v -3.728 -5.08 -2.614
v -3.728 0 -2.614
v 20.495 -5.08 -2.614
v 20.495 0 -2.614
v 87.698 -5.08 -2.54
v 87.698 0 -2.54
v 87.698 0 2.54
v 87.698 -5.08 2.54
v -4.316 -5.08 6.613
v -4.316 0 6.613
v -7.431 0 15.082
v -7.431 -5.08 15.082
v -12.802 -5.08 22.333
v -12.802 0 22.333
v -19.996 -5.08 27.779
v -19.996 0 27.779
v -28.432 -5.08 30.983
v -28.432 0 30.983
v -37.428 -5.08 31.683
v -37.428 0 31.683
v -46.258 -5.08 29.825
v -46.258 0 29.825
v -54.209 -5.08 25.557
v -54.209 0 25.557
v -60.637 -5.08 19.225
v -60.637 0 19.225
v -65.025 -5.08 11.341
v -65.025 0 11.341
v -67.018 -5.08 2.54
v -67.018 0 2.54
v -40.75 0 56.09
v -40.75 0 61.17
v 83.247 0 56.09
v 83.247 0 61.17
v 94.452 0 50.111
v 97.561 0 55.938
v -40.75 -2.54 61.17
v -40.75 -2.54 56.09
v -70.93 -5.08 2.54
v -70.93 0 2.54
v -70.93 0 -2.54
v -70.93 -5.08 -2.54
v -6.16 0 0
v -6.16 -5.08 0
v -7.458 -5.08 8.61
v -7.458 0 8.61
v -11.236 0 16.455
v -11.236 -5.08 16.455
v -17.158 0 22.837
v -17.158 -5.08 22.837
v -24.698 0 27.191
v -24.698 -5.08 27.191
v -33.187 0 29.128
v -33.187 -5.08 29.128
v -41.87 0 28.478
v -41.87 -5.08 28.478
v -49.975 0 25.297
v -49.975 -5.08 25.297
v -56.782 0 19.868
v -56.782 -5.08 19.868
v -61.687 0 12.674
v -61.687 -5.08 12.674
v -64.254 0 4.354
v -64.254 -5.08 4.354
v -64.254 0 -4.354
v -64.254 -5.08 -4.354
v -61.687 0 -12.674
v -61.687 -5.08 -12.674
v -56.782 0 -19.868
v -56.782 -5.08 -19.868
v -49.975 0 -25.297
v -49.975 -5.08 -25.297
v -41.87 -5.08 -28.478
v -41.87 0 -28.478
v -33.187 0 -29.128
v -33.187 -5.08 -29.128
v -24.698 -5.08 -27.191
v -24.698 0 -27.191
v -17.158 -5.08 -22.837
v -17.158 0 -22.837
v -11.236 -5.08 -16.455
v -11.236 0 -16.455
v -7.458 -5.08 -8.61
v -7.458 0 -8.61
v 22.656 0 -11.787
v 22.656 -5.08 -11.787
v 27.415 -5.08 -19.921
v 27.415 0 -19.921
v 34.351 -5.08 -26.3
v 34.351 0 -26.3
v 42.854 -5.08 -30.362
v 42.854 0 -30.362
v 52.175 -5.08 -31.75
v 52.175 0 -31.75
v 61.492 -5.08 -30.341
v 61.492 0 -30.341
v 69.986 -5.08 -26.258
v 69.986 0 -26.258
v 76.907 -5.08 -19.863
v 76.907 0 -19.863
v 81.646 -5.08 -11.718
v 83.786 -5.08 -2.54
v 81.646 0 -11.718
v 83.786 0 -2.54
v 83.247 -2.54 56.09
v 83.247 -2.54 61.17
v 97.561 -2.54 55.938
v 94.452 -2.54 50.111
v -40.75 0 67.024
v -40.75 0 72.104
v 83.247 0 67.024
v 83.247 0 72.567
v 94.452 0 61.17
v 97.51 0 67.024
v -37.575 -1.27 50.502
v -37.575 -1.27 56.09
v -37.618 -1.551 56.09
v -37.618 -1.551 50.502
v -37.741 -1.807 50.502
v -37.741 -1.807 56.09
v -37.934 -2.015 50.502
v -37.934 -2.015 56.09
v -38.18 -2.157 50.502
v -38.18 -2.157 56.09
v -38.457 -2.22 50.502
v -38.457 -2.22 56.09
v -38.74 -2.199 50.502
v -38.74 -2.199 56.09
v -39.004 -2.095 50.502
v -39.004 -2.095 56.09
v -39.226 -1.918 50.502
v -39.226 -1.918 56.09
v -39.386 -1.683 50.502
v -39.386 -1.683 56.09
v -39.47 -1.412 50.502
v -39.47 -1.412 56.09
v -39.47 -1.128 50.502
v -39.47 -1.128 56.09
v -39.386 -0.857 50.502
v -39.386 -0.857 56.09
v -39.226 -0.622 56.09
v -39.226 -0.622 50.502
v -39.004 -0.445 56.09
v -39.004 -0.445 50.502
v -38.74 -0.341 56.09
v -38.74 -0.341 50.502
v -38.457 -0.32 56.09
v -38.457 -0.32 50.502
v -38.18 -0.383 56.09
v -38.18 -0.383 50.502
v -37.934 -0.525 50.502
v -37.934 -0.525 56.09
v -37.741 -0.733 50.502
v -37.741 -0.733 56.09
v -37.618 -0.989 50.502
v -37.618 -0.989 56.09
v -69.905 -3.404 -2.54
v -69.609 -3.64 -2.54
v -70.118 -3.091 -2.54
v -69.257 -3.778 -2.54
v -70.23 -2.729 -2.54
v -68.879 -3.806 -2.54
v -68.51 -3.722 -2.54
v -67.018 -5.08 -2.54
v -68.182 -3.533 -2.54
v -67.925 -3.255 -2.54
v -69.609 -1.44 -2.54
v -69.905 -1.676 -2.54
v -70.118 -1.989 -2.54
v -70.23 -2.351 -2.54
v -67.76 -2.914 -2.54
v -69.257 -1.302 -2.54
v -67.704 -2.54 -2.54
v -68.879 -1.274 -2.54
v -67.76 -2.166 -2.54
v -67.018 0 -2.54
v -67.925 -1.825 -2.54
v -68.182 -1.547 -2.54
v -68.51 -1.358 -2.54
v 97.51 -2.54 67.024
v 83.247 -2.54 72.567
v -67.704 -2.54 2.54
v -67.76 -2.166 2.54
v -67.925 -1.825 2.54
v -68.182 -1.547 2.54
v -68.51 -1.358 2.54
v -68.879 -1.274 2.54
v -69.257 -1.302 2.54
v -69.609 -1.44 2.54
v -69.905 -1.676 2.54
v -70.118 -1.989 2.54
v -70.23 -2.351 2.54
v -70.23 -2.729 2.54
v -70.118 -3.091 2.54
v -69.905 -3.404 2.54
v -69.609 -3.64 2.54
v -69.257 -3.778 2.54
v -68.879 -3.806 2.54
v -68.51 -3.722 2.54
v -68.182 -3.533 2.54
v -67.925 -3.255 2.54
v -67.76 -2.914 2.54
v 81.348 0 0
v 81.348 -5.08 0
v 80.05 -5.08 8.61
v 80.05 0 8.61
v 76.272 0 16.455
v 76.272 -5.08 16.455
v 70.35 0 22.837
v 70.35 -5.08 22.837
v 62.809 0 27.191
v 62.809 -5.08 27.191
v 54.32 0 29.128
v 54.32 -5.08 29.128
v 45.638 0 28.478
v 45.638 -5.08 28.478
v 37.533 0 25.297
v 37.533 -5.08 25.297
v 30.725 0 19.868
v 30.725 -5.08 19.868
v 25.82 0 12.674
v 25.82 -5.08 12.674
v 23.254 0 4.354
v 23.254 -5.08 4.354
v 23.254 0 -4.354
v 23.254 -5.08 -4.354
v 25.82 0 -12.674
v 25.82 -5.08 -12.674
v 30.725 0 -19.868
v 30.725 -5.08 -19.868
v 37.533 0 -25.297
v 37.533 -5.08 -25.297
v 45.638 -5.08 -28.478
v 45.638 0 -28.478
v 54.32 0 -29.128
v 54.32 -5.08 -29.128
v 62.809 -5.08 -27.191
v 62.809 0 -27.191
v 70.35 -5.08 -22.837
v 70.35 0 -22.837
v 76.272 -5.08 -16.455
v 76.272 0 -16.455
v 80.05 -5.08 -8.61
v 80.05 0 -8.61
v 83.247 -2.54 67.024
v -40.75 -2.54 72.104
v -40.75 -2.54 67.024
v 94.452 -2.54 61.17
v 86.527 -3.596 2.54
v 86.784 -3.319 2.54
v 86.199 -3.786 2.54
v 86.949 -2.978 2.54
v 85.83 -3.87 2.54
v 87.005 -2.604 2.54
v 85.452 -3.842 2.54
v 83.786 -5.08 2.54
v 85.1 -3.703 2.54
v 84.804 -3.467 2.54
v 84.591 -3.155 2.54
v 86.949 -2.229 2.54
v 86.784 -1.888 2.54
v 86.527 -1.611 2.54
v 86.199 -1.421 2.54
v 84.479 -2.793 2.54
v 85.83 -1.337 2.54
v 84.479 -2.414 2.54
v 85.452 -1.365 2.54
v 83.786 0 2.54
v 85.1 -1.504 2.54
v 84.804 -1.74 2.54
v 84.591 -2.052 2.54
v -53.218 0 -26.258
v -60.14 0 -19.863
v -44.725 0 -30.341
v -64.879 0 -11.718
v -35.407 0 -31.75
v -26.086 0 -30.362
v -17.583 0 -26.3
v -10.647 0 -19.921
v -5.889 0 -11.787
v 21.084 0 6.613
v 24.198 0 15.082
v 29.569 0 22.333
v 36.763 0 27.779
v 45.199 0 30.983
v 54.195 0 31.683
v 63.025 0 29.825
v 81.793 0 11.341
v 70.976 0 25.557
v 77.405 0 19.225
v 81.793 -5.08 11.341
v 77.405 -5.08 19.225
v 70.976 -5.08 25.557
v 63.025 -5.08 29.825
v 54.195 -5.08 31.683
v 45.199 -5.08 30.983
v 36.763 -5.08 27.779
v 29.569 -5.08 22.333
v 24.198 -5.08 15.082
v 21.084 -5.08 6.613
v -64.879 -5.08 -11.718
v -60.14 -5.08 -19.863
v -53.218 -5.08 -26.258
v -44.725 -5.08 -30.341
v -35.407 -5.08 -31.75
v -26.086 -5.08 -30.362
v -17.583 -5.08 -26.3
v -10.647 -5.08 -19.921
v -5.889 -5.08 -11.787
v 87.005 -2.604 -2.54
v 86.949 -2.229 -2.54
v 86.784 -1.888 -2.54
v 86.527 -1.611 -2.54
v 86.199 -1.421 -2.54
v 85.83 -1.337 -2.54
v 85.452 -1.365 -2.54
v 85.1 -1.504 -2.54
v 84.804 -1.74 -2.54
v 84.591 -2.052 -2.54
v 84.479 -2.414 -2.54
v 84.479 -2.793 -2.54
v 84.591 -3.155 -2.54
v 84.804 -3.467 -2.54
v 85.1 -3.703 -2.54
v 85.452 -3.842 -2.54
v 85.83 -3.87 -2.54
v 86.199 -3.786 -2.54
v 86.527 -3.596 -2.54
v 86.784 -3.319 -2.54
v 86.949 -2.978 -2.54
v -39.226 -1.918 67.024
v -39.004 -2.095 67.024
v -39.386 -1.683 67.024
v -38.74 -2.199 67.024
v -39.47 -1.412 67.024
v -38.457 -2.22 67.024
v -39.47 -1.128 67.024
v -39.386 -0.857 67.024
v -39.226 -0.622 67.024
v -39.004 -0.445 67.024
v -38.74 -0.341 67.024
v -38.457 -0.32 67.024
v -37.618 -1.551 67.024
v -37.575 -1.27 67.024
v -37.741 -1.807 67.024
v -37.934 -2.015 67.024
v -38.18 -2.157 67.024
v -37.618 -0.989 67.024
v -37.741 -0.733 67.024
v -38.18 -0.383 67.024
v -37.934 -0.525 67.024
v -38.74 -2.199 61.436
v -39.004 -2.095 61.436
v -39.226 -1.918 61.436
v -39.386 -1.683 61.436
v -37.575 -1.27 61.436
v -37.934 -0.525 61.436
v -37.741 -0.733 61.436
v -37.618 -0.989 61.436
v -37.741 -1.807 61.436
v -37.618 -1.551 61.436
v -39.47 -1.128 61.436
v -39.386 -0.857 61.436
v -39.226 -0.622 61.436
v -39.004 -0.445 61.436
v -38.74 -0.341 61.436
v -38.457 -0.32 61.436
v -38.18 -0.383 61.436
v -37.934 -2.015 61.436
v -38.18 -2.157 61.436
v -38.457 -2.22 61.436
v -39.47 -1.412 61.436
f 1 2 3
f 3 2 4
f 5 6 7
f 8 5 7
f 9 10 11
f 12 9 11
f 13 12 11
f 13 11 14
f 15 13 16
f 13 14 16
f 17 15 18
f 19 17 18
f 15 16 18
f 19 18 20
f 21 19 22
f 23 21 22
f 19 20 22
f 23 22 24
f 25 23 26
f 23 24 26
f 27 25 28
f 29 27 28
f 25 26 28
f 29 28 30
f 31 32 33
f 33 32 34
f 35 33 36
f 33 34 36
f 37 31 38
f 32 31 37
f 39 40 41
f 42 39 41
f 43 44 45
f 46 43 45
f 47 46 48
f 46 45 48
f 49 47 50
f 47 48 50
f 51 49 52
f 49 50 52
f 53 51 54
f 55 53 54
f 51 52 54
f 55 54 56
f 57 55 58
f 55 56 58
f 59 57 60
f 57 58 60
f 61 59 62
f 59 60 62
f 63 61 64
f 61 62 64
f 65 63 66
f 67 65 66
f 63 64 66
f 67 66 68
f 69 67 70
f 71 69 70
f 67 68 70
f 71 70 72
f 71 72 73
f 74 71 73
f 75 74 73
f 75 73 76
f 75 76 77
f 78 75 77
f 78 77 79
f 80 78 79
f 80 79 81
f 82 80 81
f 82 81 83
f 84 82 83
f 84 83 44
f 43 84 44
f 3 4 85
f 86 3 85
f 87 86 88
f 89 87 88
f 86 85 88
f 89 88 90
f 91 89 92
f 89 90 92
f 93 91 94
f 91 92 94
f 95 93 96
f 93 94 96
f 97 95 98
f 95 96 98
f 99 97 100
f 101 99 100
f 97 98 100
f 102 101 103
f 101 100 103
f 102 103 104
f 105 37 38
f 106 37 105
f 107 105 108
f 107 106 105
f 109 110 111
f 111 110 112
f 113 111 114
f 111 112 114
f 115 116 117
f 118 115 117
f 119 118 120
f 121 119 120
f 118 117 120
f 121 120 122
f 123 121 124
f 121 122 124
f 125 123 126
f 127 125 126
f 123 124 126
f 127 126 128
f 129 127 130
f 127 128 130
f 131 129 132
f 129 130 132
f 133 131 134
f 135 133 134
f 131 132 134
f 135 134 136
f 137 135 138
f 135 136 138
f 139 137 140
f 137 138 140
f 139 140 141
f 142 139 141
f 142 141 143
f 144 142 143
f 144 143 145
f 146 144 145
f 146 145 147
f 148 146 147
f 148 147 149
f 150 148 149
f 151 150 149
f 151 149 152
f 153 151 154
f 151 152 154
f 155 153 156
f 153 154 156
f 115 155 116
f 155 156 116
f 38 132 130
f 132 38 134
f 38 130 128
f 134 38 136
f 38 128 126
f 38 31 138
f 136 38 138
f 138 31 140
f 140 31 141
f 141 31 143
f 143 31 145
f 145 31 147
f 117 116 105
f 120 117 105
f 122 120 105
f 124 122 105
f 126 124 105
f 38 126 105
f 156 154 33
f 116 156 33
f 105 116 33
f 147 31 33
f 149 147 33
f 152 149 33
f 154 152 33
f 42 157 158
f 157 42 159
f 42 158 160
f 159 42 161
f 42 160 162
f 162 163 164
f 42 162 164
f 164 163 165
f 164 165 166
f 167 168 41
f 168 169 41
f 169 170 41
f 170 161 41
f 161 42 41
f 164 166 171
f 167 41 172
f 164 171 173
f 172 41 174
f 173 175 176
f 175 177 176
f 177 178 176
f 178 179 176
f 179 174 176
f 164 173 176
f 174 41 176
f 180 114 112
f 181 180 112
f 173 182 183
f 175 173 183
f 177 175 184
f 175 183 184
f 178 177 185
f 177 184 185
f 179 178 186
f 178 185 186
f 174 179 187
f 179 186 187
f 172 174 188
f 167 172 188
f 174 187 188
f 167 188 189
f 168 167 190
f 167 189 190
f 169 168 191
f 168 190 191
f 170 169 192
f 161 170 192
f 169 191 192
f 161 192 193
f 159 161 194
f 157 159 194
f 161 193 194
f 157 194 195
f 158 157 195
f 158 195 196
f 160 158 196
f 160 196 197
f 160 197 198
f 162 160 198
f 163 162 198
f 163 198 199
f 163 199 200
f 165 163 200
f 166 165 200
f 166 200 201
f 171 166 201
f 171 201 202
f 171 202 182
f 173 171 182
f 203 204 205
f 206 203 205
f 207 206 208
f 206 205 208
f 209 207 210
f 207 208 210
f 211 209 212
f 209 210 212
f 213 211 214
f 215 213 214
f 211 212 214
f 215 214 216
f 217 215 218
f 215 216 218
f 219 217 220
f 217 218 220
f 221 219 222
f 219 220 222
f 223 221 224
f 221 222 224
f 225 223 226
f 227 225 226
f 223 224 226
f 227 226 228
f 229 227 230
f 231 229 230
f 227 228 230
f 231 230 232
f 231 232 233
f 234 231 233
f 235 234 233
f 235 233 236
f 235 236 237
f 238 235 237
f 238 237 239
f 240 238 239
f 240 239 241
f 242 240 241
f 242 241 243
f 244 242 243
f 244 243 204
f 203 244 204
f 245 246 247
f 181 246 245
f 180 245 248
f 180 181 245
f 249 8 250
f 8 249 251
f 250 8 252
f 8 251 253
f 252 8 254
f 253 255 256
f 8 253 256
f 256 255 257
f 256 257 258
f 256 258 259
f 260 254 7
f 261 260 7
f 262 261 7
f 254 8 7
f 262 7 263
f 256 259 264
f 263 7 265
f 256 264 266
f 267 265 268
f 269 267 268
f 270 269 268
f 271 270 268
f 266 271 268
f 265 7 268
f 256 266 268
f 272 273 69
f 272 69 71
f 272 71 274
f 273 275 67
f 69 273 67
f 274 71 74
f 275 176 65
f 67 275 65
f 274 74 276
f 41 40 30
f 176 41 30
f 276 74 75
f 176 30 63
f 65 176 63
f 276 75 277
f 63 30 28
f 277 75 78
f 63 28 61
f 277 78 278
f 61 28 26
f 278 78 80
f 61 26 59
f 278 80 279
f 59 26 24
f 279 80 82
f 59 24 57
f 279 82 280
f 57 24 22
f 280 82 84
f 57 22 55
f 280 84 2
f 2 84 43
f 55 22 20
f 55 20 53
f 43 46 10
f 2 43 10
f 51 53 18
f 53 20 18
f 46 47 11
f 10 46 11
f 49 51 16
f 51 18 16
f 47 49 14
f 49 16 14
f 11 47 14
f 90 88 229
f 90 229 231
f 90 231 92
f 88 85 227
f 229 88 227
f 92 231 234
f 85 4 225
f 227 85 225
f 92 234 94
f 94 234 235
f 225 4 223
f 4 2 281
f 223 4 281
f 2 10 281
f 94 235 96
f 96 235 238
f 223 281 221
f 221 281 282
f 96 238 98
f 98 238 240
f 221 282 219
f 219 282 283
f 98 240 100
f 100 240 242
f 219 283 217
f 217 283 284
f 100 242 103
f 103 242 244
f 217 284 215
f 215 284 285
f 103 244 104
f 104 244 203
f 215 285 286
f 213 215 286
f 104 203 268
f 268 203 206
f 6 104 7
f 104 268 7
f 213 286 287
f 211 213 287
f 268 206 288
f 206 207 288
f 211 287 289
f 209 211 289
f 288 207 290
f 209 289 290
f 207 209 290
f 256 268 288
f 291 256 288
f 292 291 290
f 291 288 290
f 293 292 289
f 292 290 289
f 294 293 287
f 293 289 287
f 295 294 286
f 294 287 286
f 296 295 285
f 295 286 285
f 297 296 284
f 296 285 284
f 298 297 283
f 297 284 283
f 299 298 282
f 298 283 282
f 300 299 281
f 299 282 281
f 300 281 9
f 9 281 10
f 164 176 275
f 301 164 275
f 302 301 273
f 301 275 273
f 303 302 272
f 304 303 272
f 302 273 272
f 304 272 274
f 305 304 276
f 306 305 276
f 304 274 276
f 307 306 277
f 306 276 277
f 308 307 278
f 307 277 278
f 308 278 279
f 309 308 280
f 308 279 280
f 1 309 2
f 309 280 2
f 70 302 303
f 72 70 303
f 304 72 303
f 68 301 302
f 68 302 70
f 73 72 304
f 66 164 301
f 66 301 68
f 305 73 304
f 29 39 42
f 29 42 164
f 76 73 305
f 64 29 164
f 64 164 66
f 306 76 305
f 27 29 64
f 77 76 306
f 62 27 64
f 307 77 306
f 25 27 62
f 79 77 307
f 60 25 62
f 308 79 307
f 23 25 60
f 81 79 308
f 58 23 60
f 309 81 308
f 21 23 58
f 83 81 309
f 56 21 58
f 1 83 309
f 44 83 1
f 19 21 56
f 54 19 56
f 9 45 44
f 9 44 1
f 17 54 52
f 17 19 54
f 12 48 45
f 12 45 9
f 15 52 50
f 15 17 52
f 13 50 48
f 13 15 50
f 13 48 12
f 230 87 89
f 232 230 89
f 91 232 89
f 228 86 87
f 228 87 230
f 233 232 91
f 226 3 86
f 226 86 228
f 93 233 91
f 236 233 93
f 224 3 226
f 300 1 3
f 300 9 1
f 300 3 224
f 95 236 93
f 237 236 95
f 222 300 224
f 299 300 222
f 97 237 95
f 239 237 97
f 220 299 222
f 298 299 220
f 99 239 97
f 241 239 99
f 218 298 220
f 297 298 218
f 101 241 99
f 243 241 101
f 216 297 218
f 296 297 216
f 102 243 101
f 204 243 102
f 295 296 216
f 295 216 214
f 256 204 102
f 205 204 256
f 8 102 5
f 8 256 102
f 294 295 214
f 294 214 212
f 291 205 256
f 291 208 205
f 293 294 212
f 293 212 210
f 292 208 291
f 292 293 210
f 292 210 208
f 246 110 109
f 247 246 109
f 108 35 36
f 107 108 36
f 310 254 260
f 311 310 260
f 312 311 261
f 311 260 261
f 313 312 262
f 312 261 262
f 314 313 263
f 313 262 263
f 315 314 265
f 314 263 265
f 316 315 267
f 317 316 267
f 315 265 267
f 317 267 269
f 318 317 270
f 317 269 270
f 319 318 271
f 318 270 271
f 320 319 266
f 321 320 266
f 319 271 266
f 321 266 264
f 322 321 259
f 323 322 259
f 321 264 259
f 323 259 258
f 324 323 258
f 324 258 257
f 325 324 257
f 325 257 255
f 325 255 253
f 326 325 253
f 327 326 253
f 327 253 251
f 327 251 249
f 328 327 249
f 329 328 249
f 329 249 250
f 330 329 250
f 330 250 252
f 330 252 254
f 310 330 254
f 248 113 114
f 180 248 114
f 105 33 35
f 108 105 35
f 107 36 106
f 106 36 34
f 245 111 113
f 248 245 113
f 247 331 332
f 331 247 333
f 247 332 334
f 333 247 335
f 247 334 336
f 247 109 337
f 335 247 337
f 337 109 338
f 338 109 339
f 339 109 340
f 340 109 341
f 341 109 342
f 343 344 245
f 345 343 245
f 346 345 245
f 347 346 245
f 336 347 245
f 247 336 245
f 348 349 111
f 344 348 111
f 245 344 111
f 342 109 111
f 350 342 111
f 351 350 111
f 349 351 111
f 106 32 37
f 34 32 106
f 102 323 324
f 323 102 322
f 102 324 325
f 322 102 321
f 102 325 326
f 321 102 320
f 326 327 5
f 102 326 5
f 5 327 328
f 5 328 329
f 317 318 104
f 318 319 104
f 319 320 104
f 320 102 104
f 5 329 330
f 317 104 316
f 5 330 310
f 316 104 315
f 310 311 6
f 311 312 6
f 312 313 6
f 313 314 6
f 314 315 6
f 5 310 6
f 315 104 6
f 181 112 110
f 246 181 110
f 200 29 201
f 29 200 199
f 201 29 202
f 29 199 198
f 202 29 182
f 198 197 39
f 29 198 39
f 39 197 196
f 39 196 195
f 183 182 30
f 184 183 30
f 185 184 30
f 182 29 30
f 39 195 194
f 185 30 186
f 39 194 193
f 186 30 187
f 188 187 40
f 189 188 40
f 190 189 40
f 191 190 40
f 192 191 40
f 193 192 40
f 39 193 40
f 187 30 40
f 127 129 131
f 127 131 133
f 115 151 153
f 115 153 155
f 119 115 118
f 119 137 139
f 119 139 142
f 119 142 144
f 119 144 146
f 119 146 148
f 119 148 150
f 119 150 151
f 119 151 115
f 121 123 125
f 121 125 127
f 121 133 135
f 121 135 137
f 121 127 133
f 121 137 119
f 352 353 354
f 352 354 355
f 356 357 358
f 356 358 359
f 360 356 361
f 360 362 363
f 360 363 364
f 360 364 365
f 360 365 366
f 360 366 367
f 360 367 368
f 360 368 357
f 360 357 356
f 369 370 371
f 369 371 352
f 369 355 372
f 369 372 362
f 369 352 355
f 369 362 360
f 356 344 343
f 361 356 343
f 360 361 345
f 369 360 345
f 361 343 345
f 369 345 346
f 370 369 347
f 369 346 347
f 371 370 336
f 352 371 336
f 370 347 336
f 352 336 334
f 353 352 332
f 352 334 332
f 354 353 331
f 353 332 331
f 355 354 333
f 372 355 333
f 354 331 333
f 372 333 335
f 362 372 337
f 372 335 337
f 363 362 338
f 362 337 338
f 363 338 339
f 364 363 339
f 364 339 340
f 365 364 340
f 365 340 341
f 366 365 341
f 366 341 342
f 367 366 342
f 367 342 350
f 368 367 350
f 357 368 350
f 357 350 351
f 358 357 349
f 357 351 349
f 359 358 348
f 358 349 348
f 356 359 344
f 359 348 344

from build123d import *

# Parameters (mm, degrees)
F1_DEPTH  = 5.08
F2_R      = 29.21
F3_DEPTH  = 25.4
F4_R      = 1.27
F5_DEPTH  = 25.4
F7_DEPTH  = 2.54
F6_W      = 123.9972203185
F6_H      = 5.08
F8_R      = 0.9525
F9_DEPTH  = 5.588
F10_R     = 0.9525
F11_DEPTH = 5.588


with BuildPart() as f1:
    # F0 (on Front) → F1 (new body)
    with BuildSketch(Plane.XZ):
        with BuildLine():
            ThreePointArc((-3.7277518922, -2.6140995437), (-3.6469152678, -1.3081606084), (-3.6199544637, 0))
            ThreePointArc((-3.6199544637, 0), (-3.7945023837, 3.3246542598), (-4.3162269643, 6.6127534653))
            Line((-4.3162269643, 6.6127534653), (-3.7277518922, -2.6140995437))
        make_face()
        with BuildLine():
            ThreePointArc((-4.3162269643, 6.6127534653), (-3.7945023837, 3.3246542598), (-3.6199544637, 0))
            ThreePointArc((-3.6199544637, 0), (-3.6469152678, -1.3081606084), (-3.7277518922, -2.6140995437))
            Line((-3.7277518922, -2.6140995437), (20.4952979636, -2.6140995437))
            ThreePointArc((20.4952979636, -2.6140995437), (20.4518789383, 2.0208621982), (21.0837730357, 6.6127534653))
            Line((21.0837730357, 6.6127534653), (-4.3162269643, 6.6127534653))
        make_face()
        with BuildLine():
            Line((-3.7277518922, -2.6140995437), (-4.3162269643, 6.6127534653))
            ThreePointArc((-4.3162269643, 6.6127534653), (-37.4279123251, 31.6832338855), (-67.0181913814, 2.54))
            Line((-67.0181913814, 2.54), (-63.3099544637, 2.54))
            Line((-63.3099544637, 2.54), (-63.3099544637, -2.54))
            Line((-63.3099544637, -2.54), (-67.0181913814, -2.54))
            ThreePointArc((-67.0181913814, -2.54), (-35.4071268852, -31.7499782395), (-3.7277518922, -2.6140995437))
        make_face()
        with BuildLine():
            Line((-63.3099544637, 2.54), (-67.0181913814, 2.54))
            ThreePointArc((-67.0181913814, 2.54), (-67.1199544637, 0), (-67.0181913814, -2.54))
            Line((-67.0181913814, -2.54), (-63.3099544637, -2.54))
            Line((-63.3099544637, -2.54), (-63.3099544637, 2.54))
        make_face()
        with BuildLine():
            ThreePointArc((-67.0181913814, -2.54), (-67.1199544637, 0), (-67.0181913814, 2.54))
            Line((-67.0181913814, 2.54), (-70.9299544637, 2.54))
            Line((-70.9299544637, 2.54), (-70.9299544637, -2.54))
            Line((-70.9299544637, -2.54), (-67.0181913814, -2.54))
        make_face()
        with BuildLine():
            Line((20.4952979636, -2.6140995437), (21.0837730357, 6.6127534653))
            ThreePointArc((21.0837730357, 6.6127534653), (20.4518789383, 2.0208621982), (20.4952979636, -2.6140995437))
        make_face()
        with BuildLine():
            ThreePointArc((83.7857374528, 2.54), (54.1954583966, 31.6832338855), (21.0837730357, 6.6127534653))
            Line((21.0837730357, 6.6127534653), (20.4952979636, -2.6140995437))
            ThreePointArc((20.4952979636, -2.6140995437), (52.1746729567, -31.7499782395), (83.7857374528, -2.54))
            Line((83.7857374528, -2.54), (80.0775005351, -2.54))
            Line((80.0775005351, -2.54), (80.0775005351, 2.54))
            Line((80.0775005351, 2.54), (83.7857374528, 2.54))
        make_face()
        with BuildLine():
            Line((87.6975005351, 2.54), (83.7857374528, 2.54))
            ThreePointArc((83.7857374528, 2.54), (83.8620495637, 1.2710188556), (83.8875005351, 0))
            ThreePointArc((83.8875005351, 0), (83.8620495637, -1.2710188556), (83.7857374528, -2.54))
            Line((83.7857374528, -2.54), (87.6975005351, -2.54))
            Line((87.6975005351, -2.54), (87.6975005351, 2.54))
        make_face()
        with BuildLine():
            ThreePointArc((83.8875005351, 0), (83.8620495637, 1.2710188556), (83.7857374528, 2.54))
            Line((83.7857374528, 2.54), (80.0775005351, 2.54))
            Line((80.0775005351, 2.54), (80.0775005351, -2.54))
            Line((80.0775005351, -2.54), (83.7857374528, -2.54))
            ThreePointArc((83.7857374528, -2.54), (83.8620495637, -1.2710188556), (83.8875005351, 0))
        make_face()
    extrude(amount=F1_DEPTH)

    # F2 (on face) → F3 (cut)
    with BuildSketch(Plane.XZ.offset(5.08)):
        with Locations((-35.3699544637, 0)):
            Circle(F2_R)
        with Locations((52.1375005351, 0)):
            Circle(F2_R)
    extrude(amount=-F3_DEPTH, mode=Mode.SUBTRACT)

    # F4 (on face) → F5 (cut)
    with BuildSketch(Plane.XY.offset(2.54)):
        with Locations((-68.9740729225, -2.54)):
            Circle(F4_R)
        with Locations((85.7350602746, -2.603512723)):
            Circle(F4_R)
    extrude(amount=-F5_DEPTH, mode=Mode.SUBTRACT)


with BuildPart() as f7:
    # F6 (on Front) → F7 (new body)
    with BuildSketch(Plane.XZ):
        Polygon((83.2470193171, 72.5669202386), (-40.7502010014, 72.1036136825), (-40.7502010014, 67.0236136825), (83.2470193171, 67.0236136825), align=None)
        Polygon((97.5095197803, 67.0236136825), (83.2470193171, 72.5669202386), (83.2470193171, 67.0236136825), (94.4516537271, 61.1702154216), align=None)
    extrude(amount=F7_DEPTH)

    # F8 (on face) → F9 (join)
    with BuildSketch(Plane(origin=(0, 0, 67.0236136825), x_dir=(1, 0, 0), z_dir=(0, 0, -1))):
        with Locations((-38.5277010014, 1.27)):
            Circle(F8_R)
    extrude(amount=F9_DEPTH)


with BuildPart() as f7b:
    # F6 (on Front) → F7, piece 2 (new body)
    with BuildSketch(Plane.XZ):
        with Locations((21.2484091579, 58.6302154216)):
            Rectangle(F6_W, F6_H)
        Polygon((97.5606348715, 55.9378154216), (83.2470193171, 61.1702154216), (83.2470193171, 56.0902154216), (94.4516537271, 50.1114055285), align=None)
    extrude(amount=F7_DEPTH)

    # F10 (on face) → F11 (join)
    with BuildSketch(Plane(origin=(0, 0, 56.0902154216), x_dir=(1, 0, 0), z_dir=(0, 0, -1))):
        with Locations((-38.5277010014, 1.27)):
            Circle(F10_R)
    extrude(amount=F11_DEPTH)


solid = Compound([f1.part, f7.part, f7b.part])
